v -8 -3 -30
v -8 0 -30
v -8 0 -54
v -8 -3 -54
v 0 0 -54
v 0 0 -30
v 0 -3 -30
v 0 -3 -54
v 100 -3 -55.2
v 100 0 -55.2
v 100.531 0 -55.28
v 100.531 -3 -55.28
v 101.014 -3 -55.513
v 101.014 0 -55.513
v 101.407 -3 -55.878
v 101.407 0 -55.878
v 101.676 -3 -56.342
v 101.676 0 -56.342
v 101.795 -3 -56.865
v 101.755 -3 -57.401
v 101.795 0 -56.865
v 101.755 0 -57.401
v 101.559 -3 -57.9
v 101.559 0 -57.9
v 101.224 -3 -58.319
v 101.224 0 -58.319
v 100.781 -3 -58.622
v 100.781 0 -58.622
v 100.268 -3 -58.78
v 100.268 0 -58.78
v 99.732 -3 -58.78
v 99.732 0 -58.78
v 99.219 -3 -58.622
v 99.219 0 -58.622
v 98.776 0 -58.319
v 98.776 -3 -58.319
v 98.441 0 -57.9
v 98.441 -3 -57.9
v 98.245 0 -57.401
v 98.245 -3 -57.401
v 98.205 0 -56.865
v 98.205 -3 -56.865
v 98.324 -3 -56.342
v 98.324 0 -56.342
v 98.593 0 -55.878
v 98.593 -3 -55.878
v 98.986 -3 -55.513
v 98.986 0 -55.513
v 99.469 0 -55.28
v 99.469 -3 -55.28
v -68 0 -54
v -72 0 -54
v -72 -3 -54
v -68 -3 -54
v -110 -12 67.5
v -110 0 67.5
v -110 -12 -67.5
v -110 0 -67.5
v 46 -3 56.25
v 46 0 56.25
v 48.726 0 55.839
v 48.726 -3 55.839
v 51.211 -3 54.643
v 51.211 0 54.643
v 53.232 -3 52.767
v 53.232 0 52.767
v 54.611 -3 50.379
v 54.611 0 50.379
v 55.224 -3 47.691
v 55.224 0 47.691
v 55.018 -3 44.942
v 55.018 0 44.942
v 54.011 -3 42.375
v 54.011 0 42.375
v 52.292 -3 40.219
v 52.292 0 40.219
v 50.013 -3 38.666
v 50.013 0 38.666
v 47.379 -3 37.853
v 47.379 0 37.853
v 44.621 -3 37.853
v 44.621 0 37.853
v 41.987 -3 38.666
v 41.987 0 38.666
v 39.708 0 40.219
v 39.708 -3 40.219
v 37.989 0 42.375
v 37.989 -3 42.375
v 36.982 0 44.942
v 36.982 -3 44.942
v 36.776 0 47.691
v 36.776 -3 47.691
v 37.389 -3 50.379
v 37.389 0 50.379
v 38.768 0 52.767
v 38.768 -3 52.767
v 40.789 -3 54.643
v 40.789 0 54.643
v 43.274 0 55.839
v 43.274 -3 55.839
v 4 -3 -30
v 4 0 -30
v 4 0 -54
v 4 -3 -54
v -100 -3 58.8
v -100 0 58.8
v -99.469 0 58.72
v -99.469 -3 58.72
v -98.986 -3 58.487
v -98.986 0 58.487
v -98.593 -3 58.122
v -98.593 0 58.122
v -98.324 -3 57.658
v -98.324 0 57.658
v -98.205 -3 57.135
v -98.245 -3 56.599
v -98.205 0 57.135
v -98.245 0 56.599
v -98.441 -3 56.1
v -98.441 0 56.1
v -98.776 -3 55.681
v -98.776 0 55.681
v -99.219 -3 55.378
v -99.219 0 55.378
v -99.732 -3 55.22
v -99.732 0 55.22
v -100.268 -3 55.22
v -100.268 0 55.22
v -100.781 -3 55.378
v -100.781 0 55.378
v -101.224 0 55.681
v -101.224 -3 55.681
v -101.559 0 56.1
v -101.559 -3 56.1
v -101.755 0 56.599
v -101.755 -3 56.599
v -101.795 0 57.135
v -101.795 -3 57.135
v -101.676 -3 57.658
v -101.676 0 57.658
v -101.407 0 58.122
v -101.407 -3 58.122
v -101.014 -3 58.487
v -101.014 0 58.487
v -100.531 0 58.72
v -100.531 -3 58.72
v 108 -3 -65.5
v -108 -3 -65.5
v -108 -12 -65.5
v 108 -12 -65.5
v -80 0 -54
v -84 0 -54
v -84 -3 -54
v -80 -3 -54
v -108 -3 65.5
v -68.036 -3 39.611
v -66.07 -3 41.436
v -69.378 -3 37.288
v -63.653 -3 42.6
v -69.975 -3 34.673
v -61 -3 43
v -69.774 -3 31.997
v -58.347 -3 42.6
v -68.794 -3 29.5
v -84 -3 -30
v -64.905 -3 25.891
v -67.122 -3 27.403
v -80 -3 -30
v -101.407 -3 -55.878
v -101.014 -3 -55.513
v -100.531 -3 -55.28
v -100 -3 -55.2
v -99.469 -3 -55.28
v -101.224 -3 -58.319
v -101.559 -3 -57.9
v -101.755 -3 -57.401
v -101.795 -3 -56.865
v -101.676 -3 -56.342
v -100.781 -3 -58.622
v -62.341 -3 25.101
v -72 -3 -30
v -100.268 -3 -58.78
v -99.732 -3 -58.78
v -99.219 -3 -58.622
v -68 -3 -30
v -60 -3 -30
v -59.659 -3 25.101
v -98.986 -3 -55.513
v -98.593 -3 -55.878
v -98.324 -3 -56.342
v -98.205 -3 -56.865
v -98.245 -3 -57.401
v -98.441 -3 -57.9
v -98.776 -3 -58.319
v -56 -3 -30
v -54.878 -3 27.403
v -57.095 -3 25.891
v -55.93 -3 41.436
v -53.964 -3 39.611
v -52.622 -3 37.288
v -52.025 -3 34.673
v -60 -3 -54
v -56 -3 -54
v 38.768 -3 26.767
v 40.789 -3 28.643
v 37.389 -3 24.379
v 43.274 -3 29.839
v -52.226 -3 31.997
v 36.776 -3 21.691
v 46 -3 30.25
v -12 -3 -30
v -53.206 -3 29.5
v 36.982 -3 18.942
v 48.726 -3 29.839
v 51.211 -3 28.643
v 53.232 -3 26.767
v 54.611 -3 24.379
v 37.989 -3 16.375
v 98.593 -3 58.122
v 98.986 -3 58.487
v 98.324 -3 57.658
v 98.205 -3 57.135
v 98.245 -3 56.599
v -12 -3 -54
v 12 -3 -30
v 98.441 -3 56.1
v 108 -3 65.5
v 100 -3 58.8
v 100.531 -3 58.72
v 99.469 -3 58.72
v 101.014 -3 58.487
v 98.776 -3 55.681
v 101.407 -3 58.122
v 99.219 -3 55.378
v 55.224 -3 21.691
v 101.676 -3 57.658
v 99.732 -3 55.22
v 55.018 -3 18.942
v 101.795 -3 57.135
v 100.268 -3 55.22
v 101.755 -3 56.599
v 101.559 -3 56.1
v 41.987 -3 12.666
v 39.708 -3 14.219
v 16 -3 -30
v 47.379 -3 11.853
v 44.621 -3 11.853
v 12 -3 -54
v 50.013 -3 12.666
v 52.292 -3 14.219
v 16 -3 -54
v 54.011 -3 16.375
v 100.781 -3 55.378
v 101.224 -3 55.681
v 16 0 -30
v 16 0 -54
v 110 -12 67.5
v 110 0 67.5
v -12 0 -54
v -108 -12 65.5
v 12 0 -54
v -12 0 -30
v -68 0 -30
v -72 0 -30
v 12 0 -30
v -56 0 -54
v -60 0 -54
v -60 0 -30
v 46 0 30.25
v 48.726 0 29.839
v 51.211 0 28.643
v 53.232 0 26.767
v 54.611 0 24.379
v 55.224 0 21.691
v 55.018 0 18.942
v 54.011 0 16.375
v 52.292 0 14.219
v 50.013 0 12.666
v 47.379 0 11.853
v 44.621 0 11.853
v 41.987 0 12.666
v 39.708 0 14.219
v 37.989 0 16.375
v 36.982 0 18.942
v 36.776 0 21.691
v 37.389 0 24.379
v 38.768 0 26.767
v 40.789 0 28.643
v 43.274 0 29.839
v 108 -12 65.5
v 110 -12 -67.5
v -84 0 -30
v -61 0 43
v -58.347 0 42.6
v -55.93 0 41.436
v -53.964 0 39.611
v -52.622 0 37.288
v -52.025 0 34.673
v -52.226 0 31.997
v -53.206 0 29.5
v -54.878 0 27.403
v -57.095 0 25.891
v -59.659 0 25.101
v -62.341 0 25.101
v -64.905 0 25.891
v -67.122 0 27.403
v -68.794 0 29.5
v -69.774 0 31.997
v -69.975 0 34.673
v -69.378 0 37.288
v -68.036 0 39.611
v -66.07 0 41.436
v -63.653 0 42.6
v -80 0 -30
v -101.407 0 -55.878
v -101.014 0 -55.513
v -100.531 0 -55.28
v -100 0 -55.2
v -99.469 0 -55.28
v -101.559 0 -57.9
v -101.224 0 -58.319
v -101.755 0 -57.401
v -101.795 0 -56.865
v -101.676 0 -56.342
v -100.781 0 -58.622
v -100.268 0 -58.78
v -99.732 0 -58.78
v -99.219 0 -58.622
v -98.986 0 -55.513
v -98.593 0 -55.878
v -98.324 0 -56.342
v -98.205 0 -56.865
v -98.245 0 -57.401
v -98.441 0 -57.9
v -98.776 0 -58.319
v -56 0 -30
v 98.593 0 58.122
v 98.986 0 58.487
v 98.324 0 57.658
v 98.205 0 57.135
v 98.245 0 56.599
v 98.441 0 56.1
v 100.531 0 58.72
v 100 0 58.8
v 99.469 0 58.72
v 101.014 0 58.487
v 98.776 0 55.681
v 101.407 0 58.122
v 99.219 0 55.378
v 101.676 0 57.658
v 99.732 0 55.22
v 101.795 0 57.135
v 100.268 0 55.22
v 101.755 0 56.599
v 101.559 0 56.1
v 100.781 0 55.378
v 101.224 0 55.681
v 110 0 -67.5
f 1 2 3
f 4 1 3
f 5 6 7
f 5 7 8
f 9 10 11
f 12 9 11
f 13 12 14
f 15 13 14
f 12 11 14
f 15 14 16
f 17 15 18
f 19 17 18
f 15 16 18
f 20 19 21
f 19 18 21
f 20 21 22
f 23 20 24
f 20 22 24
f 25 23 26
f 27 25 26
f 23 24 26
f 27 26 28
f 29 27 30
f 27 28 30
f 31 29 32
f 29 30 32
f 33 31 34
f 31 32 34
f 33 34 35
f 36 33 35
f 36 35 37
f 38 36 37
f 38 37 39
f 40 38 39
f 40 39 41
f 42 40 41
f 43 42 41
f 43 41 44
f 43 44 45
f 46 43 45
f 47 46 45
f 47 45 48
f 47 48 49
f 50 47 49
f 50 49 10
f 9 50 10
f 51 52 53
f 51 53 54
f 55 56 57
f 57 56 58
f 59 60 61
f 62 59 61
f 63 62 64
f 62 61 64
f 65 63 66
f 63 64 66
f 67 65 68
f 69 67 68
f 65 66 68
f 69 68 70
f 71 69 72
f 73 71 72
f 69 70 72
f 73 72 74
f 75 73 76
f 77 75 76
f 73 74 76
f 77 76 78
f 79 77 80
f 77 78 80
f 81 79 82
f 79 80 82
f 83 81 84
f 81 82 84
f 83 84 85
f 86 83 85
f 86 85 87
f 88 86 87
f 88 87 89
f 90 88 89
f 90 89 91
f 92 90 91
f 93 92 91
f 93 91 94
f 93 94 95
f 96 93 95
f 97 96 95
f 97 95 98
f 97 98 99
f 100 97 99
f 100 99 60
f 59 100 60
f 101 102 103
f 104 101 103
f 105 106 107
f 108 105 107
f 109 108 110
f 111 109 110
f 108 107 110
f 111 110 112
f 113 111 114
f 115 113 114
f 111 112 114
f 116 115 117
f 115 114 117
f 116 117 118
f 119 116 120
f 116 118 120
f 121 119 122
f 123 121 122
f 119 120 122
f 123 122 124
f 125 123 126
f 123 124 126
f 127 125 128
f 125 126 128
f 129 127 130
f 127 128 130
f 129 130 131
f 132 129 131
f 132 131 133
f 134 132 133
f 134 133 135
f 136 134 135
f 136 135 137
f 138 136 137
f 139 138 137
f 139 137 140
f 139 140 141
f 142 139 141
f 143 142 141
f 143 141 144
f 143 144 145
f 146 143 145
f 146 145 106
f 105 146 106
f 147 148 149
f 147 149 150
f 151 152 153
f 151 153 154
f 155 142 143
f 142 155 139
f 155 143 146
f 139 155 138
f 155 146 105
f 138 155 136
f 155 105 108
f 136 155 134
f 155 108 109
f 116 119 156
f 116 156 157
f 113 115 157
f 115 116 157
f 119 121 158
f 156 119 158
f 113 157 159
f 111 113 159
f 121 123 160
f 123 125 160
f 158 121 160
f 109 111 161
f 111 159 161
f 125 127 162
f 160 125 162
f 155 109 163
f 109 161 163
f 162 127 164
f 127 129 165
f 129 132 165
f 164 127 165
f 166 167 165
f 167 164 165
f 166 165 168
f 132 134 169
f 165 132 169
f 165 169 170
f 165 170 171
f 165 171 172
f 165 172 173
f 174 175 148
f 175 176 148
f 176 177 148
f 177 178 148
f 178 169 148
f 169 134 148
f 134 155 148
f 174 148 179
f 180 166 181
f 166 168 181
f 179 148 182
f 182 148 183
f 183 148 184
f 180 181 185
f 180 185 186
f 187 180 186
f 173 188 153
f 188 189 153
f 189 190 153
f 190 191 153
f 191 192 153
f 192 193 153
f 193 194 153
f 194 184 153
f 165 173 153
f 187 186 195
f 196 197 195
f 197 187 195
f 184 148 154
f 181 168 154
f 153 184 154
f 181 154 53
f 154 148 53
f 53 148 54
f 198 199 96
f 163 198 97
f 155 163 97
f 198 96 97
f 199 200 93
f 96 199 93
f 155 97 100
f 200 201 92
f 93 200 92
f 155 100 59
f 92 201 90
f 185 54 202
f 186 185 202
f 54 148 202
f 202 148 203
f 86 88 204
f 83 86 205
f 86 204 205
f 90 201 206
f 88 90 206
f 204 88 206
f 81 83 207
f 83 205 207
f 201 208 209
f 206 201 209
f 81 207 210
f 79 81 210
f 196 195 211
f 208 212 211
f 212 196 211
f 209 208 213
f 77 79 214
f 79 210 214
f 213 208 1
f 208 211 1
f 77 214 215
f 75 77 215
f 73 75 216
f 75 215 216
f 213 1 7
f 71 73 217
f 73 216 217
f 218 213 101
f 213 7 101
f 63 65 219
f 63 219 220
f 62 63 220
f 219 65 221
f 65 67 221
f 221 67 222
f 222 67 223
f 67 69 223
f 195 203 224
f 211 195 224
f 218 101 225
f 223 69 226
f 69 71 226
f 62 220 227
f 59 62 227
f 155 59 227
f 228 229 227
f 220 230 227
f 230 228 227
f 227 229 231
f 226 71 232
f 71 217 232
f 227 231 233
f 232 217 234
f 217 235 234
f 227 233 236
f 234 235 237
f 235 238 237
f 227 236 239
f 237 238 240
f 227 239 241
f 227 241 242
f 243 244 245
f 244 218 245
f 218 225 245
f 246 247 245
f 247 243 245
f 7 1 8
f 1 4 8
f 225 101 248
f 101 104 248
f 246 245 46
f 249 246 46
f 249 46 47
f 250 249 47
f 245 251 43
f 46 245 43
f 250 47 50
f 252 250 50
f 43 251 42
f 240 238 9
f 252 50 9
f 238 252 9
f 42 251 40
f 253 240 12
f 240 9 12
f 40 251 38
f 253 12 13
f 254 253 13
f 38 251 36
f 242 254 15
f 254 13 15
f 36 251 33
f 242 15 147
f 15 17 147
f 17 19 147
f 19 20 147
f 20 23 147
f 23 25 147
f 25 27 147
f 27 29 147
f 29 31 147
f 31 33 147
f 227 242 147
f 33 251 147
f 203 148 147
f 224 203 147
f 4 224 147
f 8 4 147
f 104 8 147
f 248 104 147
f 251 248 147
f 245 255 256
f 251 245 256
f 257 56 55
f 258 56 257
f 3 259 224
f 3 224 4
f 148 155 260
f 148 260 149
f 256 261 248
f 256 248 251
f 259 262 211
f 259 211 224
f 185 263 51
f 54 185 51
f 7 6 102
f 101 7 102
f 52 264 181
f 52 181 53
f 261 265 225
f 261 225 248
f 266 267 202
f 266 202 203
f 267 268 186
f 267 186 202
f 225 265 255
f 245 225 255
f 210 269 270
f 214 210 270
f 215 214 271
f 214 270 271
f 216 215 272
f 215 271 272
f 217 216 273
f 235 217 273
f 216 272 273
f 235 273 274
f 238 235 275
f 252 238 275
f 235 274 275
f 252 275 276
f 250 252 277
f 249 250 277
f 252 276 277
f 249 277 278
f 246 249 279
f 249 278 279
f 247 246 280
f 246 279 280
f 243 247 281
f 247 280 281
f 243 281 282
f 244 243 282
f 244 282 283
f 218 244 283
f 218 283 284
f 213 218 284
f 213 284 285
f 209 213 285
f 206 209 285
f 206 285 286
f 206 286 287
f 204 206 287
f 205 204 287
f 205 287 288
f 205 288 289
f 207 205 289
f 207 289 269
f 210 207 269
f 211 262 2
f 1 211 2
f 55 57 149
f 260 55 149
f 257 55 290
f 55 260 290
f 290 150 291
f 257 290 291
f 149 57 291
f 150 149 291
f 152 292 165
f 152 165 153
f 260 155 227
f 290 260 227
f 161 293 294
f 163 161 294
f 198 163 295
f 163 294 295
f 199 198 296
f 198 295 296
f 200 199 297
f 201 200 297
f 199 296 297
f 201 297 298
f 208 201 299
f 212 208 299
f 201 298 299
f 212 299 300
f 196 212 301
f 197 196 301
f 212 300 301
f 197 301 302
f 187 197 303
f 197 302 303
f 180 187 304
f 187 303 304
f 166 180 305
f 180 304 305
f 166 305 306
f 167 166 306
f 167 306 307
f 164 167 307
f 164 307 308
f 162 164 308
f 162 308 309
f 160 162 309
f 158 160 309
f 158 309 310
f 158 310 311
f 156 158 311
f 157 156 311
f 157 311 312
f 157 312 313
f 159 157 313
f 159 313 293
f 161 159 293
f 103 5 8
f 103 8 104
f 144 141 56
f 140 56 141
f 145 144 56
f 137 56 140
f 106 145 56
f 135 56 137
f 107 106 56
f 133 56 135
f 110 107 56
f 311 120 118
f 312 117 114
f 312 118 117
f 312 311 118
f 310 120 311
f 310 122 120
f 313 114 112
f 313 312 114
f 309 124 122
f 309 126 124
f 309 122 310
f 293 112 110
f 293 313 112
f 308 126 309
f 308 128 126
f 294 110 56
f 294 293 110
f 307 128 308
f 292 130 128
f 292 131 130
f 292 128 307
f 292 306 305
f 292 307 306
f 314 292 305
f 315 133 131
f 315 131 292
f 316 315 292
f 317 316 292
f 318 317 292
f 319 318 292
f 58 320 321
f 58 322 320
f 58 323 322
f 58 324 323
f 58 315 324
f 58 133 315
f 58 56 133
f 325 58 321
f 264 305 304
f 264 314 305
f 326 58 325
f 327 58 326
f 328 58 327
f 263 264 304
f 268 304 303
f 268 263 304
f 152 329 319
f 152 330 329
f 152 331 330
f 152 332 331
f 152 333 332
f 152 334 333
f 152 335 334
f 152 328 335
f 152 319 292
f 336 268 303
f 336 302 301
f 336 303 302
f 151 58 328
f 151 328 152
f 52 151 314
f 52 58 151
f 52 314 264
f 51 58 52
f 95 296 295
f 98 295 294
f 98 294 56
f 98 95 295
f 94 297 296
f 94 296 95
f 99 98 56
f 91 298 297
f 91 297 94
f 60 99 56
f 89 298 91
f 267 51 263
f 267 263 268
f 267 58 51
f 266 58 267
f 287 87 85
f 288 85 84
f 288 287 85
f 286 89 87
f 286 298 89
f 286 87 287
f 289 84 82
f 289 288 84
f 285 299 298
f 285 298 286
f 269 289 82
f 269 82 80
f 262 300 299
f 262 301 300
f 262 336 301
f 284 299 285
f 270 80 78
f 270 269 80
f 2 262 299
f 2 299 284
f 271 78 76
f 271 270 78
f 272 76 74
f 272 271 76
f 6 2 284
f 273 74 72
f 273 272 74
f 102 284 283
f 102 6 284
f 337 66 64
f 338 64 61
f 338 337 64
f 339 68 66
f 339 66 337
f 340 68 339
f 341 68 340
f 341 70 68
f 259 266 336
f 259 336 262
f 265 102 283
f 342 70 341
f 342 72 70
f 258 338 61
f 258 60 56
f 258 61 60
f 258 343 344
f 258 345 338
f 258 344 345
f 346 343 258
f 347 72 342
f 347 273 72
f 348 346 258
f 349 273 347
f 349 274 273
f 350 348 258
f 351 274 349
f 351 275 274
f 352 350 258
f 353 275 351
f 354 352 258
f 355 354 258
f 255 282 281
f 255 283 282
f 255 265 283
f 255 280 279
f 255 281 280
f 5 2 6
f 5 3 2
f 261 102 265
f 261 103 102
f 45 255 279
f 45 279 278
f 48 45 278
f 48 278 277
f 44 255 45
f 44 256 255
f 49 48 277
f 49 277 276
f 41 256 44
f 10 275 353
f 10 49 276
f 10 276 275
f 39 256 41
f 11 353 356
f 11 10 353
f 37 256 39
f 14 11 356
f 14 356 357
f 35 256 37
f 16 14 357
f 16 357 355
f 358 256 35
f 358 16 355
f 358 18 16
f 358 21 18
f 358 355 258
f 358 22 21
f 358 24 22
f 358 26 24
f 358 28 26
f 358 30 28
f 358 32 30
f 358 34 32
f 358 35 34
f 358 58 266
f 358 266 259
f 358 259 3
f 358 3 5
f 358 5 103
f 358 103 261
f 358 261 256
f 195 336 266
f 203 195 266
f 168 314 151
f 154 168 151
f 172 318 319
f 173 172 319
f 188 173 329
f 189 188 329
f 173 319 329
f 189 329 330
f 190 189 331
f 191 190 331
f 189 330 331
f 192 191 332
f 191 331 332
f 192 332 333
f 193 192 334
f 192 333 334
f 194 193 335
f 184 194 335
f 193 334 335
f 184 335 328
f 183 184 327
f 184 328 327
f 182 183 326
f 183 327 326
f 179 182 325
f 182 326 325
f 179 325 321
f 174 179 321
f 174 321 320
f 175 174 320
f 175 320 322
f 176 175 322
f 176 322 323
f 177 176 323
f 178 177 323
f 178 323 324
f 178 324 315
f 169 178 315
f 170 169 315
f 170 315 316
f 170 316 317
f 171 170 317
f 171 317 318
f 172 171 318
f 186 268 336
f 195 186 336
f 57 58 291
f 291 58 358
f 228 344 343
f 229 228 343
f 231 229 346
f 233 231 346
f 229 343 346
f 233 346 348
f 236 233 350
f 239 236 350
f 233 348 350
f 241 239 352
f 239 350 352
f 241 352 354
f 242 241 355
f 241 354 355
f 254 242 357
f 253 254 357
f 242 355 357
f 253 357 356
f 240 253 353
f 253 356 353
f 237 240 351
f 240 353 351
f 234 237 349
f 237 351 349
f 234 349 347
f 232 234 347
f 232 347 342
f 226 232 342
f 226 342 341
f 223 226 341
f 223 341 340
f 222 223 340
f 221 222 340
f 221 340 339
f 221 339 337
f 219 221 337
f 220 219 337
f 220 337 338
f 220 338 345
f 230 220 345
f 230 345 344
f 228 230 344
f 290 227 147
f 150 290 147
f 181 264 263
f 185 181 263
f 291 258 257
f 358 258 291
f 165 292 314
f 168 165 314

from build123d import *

# Parameters (mm, degrees)
SKETCH_1_W                       = 220
SKETCH_1_H                       = 135
LID_TOP_3MM_DEPTH                = 3
SKETCH_2_W                       = 216
SKETCH_2_H                       = 2
LID_RIM_BACK_DEPTH               = 12
SKETCH_3_W                       = 216
SKETCH_3_H                       = 2
LID_RIM_FRONT_DEPTH              = 12
SKETCH_4_W                       = 2
SKETCH_4_H                       = 135
LID_RIM_LEFT_DEPTH               = 12
SKETCH_5_W                       = 2
SKETCH_5_H                       = 135
LID_RIM_RIGHT_DEPTH              = 12
SKETCH_6_R                       = 1.8
LID_SCREW_CLEARANCE_1_DEPTH      = 16
SKETCH_7_R                       = 1.8
LID_SCREW_CLEARANCE_2_DEPTH      = 16
SKETCH_8_R                       = 1.8
LID_SCREW_CLEARANCE_3_DEPTH      = 16
SKETCH_9_R                       = 1.8
LID_SCREW_CLEARANCE_4_DEPTH      = 16
SKETCH_10_R                      = 9
OV5647_LENS_OPENING_D18_DEPTH    = 4
SKETCH_11_R                      = 9.25
HC_SR04_ACOUSTIC_OPENING_1_DEPTH = 4
SKETCH_12_R                      = 9.25
HC_SR04_ACOUSTIC_OPENING_2_DEPTH = 4
SKETCH_13_W                      = 4
SKETCH_13_H                      = 24
VENT_SLOT_1_DEPTH                = 4
SKETCH_14_W                      = 4
SKETCH_14_H                      = 24
VENT_SLOT_2_DEPTH                = 4
SKETCH_15_W                      = 4
SKETCH_15_H                      = 24
VENT_SLOT_3_DEPTH                = 4
SKETCH_16_W                      = 4
SKETCH_16_H                      = 24
VENT_SLOT_4_DEPTH                = 4
SKETCH_17_W                      = 4
SKETCH_17_H                      = 24
VENT_SLOT_5_DEPTH                = 4
SKETCH_18_W                      = 4
SKETCH_18_H                      = 24
VENT_SLOT_6_DEPTH                = 4


with BuildPart() as part:
    # 草图1 → Lid_Top_3mm (new body)
    with BuildSketch(Plane(origin=(0, 0, 0), x_dir=(1, 0, 0), z_dir=(0, 1, 0))):
        Rectangle(SKETCH_1_W, SKETCH_1_H)
    extrude(amount=-LID_TOP_3MM_DEPTH)

    # 草图2 → Lid_Rim_Back (add)
    with BuildSketch(Plane(origin=(0, 0, 0), x_dir=(1, 0, 0), z_dir=(0, 1, 0))):
        with Locations((0, 66.5)):
            Rectangle(SKETCH_2_W, SKETCH_2_H)
    extrude(amount=-LID_RIM_BACK_DEPTH)

    # 草图3 → Lid_Rim_Front (add)
    with BuildSketch(Plane(origin=(0, 0, 0), x_dir=(1, 0, 0), z_dir=(0, 1, 0))):
        with Locations((0, -66.5)):
            Rectangle(SKETCH_3_W, SKETCH_3_H)
    extrude(amount=-LID_RIM_FRONT_DEPTH)

    # 草图4 → Lid_Rim_Left (add)
    with BuildSketch(Plane(origin=(0, 0, 0), x_dir=(1, 0, 0), z_dir=(0, 1, 0))):
        with Locations((-109, 0)):
            Rectangle(SKETCH_4_W, SKETCH_4_H)
    extrude(amount=-LID_RIM_LEFT_DEPTH)

    # 草图5 → Lid_Rim_Right (add)
    with BuildSketch(Plane(origin=(0, 0, 0), x_dir=(1, 0, 0), z_dir=(0, 1, 0))):
        with Locations((109, 0)):
            Rectangle(SKETCH_5_W, SKETCH_5_H)
    extrude(amount=-LID_RIM_RIGHT_DEPTH)

    # 草图6 → Lid_Screw_Clearance_1 (cut)
    with BuildSketch(Plane(origin=(0, 0, 0), x_dir=(1, 0, 0), z_dir=(0, 1, 0))):
        with Locations(Location((-100, -57, 0), (0, 0, 270))):
            Circle(SKETCH_6_R)
    extrude(amount=-LID_SCREW_CLEARANCE_1_DEPTH, mode=Mode.SUBTRACT)

    # 草图7 → Lid_Screw_Clearance_2 (cut)
    with BuildSketch(Plane(origin=(0, 0, 0), x_dir=(1, 0, 0), z_dir=(0, 1, 0))):
        with Locations(Location((100, -57, 0), (0, 0, 270))):
            Circle(SKETCH_7_R)
    extrude(amount=-LID_SCREW_CLEARANCE_2_DEPTH, mode=Mode.SUBTRACT)

    # 草图8 → Lid_Screw_Clearance_3 (cut)
    with BuildSketch(Plane(origin=(0, 0, 0), x_dir=(1, 0, 0), z_dir=(0, 1, 0))):
        with Locations(Location((-100, 57, 0), (0, 0, 270))):
            Circle(SKETCH_8_R)
    extrude(amount=-LID_SCREW_CLEARANCE_3_DEPTH, mode=Mode.SUBTRACT)

    # 草图9 → Lid_Screw_Clearance_4 (cut)
    with BuildSketch(Plane(origin=(0, 0, 0), x_dir=(1, 0, 0), z_dir=(0, 1, 0))):
        with Locations(Location((100, 57, 0), (0, 0, 270))):
            Circle(SKETCH_9_R)
    extrude(amount=-LID_SCREW_CLEARANCE_4_DEPTH, mode=Mode.SUBTRACT)

    # 草图10 → OV5647_Lens_Opening_D18 (cut)
    with BuildSketch(Plane(origin=(0, 0, 0), x_dir=(1, 0, 0), z_dir=(0, 1, 0))):
        with Locations(Location((-61, -34, 0), (0, 0, 270))):
            Circle(SKETCH_10_R)
    extrude(amount=-OV5647_LENS_OPENING_D18_DEPTH, mode=Mode.SUBTRACT)

    # 草图11 → HC_SR04_Acoustic_Opening_1 (cut)
    with BuildSketch(Plane(origin=(0, 0, 0), x_dir=(1, 0, 0), z_dir=(0, 1, 0))):
        with Locations(Location((46, -47, 0), (0, 0, 270))):
            Circle(SKETCH_11_R)
    extrude(amount=-HC_SR04_ACOUSTIC_OPENING_1_DEPTH, mode=Mode.SUBTRACT)

    # 草图12 → HC_SR04_Acoustic_Opening_2 (cut)
    with BuildSketch(Plane(origin=(0, 0, 0), x_dir=(1, 0, 0), z_dir=(0, 1, 0))):
        with Locations(Location((46, -21, 0), (0, 0, 270))):
            Circle(SKETCH_12_R)
    extrude(amount=-HC_SR04_ACOUSTIC_OPENING_2_DEPTH, mode=Mode.SUBTRACT)

    # 草图13 → Vent_Slot_1 (cut)
    with BuildSketch(Plane(origin=(0, 0, 0), x_dir=(1, 0, 0), z_dir=(0, 1, 0))):
        with Locations((-82, 42)):
            Rectangle(SKETCH_13_W, SKETCH_13_H)
    extrude(amount=-VENT_SLOT_1_DEPTH, mode=Mode.SUBTRACT)

    # 草图14 → Vent_Slot_2 (cut)
    with BuildSketch(Plane(origin=(0, 0, 0), x_dir=(1, 0, 0), z_dir=(0, 1, 0))):
        with Locations((-70, 42)):
            Rectangle(SKETCH_14_W, SKETCH_14_H)
    extrude(amount=-VENT_SLOT_2_DEPTH, mode=Mode.SUBTRACT)

    # 草图15 → Vent_Slot_3 (cut)
    with BuildSketch(Plane(origin=(0, 0, 0), x_dir=(1, 0, 0), z_dir=(0, 1, 0))):
        with Locations((-58, 42)):
            Rectangle(SKETCH_15_W, SKETCH_15_H)
    extrude(amount=-VENT_SLOT_3_DEPTH, mode=Mode.SUBTRACT)

    # 草图16 → Vent_Slot_4 (cut)
    with BuildSketch(Plane(origin=(0, 0, 0), x_dir=(1, 0, 0), z_dir=(0, 1, 0))):
        with Locations((-10, 42)):
            Rectangle(SKETCH_16_W, SKETCH_16_H)
    extrude(amount=-VENT_SLOT_4_DEPTH, mode=Mode.SUBTRACT)

    # 草图17 → Vent_Slot_5 (cut)
    with BuildSketch(Plane(origin=(0, 0, 0), x_dir=(1, 0, 0), z_dir=(0, 1, 0))):
        with Locations((2, 42)):
            Rectangle(SKETCH_17_W, SKETCH_17_H)
    extrude(amount=-VENT_SLOT_5_DEPTH, mode=Mode.SUBTRACT)

    # 草图18 → Vent_Slot_6 (cut)
    with BuildSketch(Plane(origin=(0, 0, 0), x_dir=(1, 0, 0), z_dir=(0, 1, 0))):
        with Locations((14, 42)):
            Rectangle(SKETCH_18_W, SKETCH_18_H)
    extrude(amount=-VENT_SLOT_6_DEPTH, mode=Mode.SUBTRACT)


solid = part.part
